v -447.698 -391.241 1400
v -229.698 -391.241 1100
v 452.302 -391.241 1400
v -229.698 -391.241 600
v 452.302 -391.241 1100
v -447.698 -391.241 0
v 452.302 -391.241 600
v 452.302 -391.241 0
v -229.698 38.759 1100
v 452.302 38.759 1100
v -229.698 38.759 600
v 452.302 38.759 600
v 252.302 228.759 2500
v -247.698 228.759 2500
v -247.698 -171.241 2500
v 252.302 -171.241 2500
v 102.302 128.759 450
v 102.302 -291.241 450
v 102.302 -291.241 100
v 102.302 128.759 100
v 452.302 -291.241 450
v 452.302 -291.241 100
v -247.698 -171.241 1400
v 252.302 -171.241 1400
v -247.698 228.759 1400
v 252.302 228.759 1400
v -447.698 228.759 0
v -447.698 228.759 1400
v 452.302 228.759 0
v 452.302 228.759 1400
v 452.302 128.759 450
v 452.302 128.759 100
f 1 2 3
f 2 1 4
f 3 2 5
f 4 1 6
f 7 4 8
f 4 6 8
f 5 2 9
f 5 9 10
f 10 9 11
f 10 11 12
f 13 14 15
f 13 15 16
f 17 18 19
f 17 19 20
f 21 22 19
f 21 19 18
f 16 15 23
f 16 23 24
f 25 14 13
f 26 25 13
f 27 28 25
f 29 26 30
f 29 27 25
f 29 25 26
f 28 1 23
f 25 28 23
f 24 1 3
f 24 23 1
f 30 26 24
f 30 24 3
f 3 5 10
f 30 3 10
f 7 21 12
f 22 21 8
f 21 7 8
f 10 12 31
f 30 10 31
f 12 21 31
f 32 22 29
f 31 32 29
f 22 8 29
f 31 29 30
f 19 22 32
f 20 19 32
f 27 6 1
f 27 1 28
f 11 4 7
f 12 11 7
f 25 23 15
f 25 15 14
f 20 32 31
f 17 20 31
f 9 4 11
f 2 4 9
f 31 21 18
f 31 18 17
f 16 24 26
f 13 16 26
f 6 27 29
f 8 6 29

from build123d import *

# Parameters (mm, degrees)
F0_W     = 900
F0_H     = 620
F1_DEPTH = 1400
F2_W     = 682
F2_H     = 500
F3_DEPTH = 430
F4_W     = 500
F4_H     = 400
F5_DEPTH = 1100
F6_W     = 420
F6_H     = 350
F7_DEPTH = 350


with BuildPart() as f1:
    # F0 (on Top) → F1 (new body)
    with BuildSketch(Plane.XY):
        with Locations((2.302444, -81.240896)):
            Rectangle(F0_W, F0_H)
    extrude(amount=F1_DEPTH)

    # F2 (on face) → F3 (cut)
    with BuildSketch(Plane.XZ.offset(391.240896)):
        with Locations((111.302444, 850)):
            Rectangle(F2_W, F2_H)
    extrude(amount=-F3_DEPTH, mode=Mode.SUBTRACT)

    # F4 (on face) → F5 (join)
    with BuildSketch(Plane.XY.offset(1400)):
        with Locations((2.302444, 28.759104)):
            Rectangle(F4_W, F4_H)
    extrude(amount=F5_DEPTH)

    # F6 (on face) → F7 (cut)
    with BuildSketch(Plane.YZ.offset(452.302444)):
        with Locations((-81.240896, 275)):
            Rectangle(F6_W, F6_H)
    extrude(amount=-F7_DEPTH, mode=Mode.SUBTRACT)


solid = f1.part
